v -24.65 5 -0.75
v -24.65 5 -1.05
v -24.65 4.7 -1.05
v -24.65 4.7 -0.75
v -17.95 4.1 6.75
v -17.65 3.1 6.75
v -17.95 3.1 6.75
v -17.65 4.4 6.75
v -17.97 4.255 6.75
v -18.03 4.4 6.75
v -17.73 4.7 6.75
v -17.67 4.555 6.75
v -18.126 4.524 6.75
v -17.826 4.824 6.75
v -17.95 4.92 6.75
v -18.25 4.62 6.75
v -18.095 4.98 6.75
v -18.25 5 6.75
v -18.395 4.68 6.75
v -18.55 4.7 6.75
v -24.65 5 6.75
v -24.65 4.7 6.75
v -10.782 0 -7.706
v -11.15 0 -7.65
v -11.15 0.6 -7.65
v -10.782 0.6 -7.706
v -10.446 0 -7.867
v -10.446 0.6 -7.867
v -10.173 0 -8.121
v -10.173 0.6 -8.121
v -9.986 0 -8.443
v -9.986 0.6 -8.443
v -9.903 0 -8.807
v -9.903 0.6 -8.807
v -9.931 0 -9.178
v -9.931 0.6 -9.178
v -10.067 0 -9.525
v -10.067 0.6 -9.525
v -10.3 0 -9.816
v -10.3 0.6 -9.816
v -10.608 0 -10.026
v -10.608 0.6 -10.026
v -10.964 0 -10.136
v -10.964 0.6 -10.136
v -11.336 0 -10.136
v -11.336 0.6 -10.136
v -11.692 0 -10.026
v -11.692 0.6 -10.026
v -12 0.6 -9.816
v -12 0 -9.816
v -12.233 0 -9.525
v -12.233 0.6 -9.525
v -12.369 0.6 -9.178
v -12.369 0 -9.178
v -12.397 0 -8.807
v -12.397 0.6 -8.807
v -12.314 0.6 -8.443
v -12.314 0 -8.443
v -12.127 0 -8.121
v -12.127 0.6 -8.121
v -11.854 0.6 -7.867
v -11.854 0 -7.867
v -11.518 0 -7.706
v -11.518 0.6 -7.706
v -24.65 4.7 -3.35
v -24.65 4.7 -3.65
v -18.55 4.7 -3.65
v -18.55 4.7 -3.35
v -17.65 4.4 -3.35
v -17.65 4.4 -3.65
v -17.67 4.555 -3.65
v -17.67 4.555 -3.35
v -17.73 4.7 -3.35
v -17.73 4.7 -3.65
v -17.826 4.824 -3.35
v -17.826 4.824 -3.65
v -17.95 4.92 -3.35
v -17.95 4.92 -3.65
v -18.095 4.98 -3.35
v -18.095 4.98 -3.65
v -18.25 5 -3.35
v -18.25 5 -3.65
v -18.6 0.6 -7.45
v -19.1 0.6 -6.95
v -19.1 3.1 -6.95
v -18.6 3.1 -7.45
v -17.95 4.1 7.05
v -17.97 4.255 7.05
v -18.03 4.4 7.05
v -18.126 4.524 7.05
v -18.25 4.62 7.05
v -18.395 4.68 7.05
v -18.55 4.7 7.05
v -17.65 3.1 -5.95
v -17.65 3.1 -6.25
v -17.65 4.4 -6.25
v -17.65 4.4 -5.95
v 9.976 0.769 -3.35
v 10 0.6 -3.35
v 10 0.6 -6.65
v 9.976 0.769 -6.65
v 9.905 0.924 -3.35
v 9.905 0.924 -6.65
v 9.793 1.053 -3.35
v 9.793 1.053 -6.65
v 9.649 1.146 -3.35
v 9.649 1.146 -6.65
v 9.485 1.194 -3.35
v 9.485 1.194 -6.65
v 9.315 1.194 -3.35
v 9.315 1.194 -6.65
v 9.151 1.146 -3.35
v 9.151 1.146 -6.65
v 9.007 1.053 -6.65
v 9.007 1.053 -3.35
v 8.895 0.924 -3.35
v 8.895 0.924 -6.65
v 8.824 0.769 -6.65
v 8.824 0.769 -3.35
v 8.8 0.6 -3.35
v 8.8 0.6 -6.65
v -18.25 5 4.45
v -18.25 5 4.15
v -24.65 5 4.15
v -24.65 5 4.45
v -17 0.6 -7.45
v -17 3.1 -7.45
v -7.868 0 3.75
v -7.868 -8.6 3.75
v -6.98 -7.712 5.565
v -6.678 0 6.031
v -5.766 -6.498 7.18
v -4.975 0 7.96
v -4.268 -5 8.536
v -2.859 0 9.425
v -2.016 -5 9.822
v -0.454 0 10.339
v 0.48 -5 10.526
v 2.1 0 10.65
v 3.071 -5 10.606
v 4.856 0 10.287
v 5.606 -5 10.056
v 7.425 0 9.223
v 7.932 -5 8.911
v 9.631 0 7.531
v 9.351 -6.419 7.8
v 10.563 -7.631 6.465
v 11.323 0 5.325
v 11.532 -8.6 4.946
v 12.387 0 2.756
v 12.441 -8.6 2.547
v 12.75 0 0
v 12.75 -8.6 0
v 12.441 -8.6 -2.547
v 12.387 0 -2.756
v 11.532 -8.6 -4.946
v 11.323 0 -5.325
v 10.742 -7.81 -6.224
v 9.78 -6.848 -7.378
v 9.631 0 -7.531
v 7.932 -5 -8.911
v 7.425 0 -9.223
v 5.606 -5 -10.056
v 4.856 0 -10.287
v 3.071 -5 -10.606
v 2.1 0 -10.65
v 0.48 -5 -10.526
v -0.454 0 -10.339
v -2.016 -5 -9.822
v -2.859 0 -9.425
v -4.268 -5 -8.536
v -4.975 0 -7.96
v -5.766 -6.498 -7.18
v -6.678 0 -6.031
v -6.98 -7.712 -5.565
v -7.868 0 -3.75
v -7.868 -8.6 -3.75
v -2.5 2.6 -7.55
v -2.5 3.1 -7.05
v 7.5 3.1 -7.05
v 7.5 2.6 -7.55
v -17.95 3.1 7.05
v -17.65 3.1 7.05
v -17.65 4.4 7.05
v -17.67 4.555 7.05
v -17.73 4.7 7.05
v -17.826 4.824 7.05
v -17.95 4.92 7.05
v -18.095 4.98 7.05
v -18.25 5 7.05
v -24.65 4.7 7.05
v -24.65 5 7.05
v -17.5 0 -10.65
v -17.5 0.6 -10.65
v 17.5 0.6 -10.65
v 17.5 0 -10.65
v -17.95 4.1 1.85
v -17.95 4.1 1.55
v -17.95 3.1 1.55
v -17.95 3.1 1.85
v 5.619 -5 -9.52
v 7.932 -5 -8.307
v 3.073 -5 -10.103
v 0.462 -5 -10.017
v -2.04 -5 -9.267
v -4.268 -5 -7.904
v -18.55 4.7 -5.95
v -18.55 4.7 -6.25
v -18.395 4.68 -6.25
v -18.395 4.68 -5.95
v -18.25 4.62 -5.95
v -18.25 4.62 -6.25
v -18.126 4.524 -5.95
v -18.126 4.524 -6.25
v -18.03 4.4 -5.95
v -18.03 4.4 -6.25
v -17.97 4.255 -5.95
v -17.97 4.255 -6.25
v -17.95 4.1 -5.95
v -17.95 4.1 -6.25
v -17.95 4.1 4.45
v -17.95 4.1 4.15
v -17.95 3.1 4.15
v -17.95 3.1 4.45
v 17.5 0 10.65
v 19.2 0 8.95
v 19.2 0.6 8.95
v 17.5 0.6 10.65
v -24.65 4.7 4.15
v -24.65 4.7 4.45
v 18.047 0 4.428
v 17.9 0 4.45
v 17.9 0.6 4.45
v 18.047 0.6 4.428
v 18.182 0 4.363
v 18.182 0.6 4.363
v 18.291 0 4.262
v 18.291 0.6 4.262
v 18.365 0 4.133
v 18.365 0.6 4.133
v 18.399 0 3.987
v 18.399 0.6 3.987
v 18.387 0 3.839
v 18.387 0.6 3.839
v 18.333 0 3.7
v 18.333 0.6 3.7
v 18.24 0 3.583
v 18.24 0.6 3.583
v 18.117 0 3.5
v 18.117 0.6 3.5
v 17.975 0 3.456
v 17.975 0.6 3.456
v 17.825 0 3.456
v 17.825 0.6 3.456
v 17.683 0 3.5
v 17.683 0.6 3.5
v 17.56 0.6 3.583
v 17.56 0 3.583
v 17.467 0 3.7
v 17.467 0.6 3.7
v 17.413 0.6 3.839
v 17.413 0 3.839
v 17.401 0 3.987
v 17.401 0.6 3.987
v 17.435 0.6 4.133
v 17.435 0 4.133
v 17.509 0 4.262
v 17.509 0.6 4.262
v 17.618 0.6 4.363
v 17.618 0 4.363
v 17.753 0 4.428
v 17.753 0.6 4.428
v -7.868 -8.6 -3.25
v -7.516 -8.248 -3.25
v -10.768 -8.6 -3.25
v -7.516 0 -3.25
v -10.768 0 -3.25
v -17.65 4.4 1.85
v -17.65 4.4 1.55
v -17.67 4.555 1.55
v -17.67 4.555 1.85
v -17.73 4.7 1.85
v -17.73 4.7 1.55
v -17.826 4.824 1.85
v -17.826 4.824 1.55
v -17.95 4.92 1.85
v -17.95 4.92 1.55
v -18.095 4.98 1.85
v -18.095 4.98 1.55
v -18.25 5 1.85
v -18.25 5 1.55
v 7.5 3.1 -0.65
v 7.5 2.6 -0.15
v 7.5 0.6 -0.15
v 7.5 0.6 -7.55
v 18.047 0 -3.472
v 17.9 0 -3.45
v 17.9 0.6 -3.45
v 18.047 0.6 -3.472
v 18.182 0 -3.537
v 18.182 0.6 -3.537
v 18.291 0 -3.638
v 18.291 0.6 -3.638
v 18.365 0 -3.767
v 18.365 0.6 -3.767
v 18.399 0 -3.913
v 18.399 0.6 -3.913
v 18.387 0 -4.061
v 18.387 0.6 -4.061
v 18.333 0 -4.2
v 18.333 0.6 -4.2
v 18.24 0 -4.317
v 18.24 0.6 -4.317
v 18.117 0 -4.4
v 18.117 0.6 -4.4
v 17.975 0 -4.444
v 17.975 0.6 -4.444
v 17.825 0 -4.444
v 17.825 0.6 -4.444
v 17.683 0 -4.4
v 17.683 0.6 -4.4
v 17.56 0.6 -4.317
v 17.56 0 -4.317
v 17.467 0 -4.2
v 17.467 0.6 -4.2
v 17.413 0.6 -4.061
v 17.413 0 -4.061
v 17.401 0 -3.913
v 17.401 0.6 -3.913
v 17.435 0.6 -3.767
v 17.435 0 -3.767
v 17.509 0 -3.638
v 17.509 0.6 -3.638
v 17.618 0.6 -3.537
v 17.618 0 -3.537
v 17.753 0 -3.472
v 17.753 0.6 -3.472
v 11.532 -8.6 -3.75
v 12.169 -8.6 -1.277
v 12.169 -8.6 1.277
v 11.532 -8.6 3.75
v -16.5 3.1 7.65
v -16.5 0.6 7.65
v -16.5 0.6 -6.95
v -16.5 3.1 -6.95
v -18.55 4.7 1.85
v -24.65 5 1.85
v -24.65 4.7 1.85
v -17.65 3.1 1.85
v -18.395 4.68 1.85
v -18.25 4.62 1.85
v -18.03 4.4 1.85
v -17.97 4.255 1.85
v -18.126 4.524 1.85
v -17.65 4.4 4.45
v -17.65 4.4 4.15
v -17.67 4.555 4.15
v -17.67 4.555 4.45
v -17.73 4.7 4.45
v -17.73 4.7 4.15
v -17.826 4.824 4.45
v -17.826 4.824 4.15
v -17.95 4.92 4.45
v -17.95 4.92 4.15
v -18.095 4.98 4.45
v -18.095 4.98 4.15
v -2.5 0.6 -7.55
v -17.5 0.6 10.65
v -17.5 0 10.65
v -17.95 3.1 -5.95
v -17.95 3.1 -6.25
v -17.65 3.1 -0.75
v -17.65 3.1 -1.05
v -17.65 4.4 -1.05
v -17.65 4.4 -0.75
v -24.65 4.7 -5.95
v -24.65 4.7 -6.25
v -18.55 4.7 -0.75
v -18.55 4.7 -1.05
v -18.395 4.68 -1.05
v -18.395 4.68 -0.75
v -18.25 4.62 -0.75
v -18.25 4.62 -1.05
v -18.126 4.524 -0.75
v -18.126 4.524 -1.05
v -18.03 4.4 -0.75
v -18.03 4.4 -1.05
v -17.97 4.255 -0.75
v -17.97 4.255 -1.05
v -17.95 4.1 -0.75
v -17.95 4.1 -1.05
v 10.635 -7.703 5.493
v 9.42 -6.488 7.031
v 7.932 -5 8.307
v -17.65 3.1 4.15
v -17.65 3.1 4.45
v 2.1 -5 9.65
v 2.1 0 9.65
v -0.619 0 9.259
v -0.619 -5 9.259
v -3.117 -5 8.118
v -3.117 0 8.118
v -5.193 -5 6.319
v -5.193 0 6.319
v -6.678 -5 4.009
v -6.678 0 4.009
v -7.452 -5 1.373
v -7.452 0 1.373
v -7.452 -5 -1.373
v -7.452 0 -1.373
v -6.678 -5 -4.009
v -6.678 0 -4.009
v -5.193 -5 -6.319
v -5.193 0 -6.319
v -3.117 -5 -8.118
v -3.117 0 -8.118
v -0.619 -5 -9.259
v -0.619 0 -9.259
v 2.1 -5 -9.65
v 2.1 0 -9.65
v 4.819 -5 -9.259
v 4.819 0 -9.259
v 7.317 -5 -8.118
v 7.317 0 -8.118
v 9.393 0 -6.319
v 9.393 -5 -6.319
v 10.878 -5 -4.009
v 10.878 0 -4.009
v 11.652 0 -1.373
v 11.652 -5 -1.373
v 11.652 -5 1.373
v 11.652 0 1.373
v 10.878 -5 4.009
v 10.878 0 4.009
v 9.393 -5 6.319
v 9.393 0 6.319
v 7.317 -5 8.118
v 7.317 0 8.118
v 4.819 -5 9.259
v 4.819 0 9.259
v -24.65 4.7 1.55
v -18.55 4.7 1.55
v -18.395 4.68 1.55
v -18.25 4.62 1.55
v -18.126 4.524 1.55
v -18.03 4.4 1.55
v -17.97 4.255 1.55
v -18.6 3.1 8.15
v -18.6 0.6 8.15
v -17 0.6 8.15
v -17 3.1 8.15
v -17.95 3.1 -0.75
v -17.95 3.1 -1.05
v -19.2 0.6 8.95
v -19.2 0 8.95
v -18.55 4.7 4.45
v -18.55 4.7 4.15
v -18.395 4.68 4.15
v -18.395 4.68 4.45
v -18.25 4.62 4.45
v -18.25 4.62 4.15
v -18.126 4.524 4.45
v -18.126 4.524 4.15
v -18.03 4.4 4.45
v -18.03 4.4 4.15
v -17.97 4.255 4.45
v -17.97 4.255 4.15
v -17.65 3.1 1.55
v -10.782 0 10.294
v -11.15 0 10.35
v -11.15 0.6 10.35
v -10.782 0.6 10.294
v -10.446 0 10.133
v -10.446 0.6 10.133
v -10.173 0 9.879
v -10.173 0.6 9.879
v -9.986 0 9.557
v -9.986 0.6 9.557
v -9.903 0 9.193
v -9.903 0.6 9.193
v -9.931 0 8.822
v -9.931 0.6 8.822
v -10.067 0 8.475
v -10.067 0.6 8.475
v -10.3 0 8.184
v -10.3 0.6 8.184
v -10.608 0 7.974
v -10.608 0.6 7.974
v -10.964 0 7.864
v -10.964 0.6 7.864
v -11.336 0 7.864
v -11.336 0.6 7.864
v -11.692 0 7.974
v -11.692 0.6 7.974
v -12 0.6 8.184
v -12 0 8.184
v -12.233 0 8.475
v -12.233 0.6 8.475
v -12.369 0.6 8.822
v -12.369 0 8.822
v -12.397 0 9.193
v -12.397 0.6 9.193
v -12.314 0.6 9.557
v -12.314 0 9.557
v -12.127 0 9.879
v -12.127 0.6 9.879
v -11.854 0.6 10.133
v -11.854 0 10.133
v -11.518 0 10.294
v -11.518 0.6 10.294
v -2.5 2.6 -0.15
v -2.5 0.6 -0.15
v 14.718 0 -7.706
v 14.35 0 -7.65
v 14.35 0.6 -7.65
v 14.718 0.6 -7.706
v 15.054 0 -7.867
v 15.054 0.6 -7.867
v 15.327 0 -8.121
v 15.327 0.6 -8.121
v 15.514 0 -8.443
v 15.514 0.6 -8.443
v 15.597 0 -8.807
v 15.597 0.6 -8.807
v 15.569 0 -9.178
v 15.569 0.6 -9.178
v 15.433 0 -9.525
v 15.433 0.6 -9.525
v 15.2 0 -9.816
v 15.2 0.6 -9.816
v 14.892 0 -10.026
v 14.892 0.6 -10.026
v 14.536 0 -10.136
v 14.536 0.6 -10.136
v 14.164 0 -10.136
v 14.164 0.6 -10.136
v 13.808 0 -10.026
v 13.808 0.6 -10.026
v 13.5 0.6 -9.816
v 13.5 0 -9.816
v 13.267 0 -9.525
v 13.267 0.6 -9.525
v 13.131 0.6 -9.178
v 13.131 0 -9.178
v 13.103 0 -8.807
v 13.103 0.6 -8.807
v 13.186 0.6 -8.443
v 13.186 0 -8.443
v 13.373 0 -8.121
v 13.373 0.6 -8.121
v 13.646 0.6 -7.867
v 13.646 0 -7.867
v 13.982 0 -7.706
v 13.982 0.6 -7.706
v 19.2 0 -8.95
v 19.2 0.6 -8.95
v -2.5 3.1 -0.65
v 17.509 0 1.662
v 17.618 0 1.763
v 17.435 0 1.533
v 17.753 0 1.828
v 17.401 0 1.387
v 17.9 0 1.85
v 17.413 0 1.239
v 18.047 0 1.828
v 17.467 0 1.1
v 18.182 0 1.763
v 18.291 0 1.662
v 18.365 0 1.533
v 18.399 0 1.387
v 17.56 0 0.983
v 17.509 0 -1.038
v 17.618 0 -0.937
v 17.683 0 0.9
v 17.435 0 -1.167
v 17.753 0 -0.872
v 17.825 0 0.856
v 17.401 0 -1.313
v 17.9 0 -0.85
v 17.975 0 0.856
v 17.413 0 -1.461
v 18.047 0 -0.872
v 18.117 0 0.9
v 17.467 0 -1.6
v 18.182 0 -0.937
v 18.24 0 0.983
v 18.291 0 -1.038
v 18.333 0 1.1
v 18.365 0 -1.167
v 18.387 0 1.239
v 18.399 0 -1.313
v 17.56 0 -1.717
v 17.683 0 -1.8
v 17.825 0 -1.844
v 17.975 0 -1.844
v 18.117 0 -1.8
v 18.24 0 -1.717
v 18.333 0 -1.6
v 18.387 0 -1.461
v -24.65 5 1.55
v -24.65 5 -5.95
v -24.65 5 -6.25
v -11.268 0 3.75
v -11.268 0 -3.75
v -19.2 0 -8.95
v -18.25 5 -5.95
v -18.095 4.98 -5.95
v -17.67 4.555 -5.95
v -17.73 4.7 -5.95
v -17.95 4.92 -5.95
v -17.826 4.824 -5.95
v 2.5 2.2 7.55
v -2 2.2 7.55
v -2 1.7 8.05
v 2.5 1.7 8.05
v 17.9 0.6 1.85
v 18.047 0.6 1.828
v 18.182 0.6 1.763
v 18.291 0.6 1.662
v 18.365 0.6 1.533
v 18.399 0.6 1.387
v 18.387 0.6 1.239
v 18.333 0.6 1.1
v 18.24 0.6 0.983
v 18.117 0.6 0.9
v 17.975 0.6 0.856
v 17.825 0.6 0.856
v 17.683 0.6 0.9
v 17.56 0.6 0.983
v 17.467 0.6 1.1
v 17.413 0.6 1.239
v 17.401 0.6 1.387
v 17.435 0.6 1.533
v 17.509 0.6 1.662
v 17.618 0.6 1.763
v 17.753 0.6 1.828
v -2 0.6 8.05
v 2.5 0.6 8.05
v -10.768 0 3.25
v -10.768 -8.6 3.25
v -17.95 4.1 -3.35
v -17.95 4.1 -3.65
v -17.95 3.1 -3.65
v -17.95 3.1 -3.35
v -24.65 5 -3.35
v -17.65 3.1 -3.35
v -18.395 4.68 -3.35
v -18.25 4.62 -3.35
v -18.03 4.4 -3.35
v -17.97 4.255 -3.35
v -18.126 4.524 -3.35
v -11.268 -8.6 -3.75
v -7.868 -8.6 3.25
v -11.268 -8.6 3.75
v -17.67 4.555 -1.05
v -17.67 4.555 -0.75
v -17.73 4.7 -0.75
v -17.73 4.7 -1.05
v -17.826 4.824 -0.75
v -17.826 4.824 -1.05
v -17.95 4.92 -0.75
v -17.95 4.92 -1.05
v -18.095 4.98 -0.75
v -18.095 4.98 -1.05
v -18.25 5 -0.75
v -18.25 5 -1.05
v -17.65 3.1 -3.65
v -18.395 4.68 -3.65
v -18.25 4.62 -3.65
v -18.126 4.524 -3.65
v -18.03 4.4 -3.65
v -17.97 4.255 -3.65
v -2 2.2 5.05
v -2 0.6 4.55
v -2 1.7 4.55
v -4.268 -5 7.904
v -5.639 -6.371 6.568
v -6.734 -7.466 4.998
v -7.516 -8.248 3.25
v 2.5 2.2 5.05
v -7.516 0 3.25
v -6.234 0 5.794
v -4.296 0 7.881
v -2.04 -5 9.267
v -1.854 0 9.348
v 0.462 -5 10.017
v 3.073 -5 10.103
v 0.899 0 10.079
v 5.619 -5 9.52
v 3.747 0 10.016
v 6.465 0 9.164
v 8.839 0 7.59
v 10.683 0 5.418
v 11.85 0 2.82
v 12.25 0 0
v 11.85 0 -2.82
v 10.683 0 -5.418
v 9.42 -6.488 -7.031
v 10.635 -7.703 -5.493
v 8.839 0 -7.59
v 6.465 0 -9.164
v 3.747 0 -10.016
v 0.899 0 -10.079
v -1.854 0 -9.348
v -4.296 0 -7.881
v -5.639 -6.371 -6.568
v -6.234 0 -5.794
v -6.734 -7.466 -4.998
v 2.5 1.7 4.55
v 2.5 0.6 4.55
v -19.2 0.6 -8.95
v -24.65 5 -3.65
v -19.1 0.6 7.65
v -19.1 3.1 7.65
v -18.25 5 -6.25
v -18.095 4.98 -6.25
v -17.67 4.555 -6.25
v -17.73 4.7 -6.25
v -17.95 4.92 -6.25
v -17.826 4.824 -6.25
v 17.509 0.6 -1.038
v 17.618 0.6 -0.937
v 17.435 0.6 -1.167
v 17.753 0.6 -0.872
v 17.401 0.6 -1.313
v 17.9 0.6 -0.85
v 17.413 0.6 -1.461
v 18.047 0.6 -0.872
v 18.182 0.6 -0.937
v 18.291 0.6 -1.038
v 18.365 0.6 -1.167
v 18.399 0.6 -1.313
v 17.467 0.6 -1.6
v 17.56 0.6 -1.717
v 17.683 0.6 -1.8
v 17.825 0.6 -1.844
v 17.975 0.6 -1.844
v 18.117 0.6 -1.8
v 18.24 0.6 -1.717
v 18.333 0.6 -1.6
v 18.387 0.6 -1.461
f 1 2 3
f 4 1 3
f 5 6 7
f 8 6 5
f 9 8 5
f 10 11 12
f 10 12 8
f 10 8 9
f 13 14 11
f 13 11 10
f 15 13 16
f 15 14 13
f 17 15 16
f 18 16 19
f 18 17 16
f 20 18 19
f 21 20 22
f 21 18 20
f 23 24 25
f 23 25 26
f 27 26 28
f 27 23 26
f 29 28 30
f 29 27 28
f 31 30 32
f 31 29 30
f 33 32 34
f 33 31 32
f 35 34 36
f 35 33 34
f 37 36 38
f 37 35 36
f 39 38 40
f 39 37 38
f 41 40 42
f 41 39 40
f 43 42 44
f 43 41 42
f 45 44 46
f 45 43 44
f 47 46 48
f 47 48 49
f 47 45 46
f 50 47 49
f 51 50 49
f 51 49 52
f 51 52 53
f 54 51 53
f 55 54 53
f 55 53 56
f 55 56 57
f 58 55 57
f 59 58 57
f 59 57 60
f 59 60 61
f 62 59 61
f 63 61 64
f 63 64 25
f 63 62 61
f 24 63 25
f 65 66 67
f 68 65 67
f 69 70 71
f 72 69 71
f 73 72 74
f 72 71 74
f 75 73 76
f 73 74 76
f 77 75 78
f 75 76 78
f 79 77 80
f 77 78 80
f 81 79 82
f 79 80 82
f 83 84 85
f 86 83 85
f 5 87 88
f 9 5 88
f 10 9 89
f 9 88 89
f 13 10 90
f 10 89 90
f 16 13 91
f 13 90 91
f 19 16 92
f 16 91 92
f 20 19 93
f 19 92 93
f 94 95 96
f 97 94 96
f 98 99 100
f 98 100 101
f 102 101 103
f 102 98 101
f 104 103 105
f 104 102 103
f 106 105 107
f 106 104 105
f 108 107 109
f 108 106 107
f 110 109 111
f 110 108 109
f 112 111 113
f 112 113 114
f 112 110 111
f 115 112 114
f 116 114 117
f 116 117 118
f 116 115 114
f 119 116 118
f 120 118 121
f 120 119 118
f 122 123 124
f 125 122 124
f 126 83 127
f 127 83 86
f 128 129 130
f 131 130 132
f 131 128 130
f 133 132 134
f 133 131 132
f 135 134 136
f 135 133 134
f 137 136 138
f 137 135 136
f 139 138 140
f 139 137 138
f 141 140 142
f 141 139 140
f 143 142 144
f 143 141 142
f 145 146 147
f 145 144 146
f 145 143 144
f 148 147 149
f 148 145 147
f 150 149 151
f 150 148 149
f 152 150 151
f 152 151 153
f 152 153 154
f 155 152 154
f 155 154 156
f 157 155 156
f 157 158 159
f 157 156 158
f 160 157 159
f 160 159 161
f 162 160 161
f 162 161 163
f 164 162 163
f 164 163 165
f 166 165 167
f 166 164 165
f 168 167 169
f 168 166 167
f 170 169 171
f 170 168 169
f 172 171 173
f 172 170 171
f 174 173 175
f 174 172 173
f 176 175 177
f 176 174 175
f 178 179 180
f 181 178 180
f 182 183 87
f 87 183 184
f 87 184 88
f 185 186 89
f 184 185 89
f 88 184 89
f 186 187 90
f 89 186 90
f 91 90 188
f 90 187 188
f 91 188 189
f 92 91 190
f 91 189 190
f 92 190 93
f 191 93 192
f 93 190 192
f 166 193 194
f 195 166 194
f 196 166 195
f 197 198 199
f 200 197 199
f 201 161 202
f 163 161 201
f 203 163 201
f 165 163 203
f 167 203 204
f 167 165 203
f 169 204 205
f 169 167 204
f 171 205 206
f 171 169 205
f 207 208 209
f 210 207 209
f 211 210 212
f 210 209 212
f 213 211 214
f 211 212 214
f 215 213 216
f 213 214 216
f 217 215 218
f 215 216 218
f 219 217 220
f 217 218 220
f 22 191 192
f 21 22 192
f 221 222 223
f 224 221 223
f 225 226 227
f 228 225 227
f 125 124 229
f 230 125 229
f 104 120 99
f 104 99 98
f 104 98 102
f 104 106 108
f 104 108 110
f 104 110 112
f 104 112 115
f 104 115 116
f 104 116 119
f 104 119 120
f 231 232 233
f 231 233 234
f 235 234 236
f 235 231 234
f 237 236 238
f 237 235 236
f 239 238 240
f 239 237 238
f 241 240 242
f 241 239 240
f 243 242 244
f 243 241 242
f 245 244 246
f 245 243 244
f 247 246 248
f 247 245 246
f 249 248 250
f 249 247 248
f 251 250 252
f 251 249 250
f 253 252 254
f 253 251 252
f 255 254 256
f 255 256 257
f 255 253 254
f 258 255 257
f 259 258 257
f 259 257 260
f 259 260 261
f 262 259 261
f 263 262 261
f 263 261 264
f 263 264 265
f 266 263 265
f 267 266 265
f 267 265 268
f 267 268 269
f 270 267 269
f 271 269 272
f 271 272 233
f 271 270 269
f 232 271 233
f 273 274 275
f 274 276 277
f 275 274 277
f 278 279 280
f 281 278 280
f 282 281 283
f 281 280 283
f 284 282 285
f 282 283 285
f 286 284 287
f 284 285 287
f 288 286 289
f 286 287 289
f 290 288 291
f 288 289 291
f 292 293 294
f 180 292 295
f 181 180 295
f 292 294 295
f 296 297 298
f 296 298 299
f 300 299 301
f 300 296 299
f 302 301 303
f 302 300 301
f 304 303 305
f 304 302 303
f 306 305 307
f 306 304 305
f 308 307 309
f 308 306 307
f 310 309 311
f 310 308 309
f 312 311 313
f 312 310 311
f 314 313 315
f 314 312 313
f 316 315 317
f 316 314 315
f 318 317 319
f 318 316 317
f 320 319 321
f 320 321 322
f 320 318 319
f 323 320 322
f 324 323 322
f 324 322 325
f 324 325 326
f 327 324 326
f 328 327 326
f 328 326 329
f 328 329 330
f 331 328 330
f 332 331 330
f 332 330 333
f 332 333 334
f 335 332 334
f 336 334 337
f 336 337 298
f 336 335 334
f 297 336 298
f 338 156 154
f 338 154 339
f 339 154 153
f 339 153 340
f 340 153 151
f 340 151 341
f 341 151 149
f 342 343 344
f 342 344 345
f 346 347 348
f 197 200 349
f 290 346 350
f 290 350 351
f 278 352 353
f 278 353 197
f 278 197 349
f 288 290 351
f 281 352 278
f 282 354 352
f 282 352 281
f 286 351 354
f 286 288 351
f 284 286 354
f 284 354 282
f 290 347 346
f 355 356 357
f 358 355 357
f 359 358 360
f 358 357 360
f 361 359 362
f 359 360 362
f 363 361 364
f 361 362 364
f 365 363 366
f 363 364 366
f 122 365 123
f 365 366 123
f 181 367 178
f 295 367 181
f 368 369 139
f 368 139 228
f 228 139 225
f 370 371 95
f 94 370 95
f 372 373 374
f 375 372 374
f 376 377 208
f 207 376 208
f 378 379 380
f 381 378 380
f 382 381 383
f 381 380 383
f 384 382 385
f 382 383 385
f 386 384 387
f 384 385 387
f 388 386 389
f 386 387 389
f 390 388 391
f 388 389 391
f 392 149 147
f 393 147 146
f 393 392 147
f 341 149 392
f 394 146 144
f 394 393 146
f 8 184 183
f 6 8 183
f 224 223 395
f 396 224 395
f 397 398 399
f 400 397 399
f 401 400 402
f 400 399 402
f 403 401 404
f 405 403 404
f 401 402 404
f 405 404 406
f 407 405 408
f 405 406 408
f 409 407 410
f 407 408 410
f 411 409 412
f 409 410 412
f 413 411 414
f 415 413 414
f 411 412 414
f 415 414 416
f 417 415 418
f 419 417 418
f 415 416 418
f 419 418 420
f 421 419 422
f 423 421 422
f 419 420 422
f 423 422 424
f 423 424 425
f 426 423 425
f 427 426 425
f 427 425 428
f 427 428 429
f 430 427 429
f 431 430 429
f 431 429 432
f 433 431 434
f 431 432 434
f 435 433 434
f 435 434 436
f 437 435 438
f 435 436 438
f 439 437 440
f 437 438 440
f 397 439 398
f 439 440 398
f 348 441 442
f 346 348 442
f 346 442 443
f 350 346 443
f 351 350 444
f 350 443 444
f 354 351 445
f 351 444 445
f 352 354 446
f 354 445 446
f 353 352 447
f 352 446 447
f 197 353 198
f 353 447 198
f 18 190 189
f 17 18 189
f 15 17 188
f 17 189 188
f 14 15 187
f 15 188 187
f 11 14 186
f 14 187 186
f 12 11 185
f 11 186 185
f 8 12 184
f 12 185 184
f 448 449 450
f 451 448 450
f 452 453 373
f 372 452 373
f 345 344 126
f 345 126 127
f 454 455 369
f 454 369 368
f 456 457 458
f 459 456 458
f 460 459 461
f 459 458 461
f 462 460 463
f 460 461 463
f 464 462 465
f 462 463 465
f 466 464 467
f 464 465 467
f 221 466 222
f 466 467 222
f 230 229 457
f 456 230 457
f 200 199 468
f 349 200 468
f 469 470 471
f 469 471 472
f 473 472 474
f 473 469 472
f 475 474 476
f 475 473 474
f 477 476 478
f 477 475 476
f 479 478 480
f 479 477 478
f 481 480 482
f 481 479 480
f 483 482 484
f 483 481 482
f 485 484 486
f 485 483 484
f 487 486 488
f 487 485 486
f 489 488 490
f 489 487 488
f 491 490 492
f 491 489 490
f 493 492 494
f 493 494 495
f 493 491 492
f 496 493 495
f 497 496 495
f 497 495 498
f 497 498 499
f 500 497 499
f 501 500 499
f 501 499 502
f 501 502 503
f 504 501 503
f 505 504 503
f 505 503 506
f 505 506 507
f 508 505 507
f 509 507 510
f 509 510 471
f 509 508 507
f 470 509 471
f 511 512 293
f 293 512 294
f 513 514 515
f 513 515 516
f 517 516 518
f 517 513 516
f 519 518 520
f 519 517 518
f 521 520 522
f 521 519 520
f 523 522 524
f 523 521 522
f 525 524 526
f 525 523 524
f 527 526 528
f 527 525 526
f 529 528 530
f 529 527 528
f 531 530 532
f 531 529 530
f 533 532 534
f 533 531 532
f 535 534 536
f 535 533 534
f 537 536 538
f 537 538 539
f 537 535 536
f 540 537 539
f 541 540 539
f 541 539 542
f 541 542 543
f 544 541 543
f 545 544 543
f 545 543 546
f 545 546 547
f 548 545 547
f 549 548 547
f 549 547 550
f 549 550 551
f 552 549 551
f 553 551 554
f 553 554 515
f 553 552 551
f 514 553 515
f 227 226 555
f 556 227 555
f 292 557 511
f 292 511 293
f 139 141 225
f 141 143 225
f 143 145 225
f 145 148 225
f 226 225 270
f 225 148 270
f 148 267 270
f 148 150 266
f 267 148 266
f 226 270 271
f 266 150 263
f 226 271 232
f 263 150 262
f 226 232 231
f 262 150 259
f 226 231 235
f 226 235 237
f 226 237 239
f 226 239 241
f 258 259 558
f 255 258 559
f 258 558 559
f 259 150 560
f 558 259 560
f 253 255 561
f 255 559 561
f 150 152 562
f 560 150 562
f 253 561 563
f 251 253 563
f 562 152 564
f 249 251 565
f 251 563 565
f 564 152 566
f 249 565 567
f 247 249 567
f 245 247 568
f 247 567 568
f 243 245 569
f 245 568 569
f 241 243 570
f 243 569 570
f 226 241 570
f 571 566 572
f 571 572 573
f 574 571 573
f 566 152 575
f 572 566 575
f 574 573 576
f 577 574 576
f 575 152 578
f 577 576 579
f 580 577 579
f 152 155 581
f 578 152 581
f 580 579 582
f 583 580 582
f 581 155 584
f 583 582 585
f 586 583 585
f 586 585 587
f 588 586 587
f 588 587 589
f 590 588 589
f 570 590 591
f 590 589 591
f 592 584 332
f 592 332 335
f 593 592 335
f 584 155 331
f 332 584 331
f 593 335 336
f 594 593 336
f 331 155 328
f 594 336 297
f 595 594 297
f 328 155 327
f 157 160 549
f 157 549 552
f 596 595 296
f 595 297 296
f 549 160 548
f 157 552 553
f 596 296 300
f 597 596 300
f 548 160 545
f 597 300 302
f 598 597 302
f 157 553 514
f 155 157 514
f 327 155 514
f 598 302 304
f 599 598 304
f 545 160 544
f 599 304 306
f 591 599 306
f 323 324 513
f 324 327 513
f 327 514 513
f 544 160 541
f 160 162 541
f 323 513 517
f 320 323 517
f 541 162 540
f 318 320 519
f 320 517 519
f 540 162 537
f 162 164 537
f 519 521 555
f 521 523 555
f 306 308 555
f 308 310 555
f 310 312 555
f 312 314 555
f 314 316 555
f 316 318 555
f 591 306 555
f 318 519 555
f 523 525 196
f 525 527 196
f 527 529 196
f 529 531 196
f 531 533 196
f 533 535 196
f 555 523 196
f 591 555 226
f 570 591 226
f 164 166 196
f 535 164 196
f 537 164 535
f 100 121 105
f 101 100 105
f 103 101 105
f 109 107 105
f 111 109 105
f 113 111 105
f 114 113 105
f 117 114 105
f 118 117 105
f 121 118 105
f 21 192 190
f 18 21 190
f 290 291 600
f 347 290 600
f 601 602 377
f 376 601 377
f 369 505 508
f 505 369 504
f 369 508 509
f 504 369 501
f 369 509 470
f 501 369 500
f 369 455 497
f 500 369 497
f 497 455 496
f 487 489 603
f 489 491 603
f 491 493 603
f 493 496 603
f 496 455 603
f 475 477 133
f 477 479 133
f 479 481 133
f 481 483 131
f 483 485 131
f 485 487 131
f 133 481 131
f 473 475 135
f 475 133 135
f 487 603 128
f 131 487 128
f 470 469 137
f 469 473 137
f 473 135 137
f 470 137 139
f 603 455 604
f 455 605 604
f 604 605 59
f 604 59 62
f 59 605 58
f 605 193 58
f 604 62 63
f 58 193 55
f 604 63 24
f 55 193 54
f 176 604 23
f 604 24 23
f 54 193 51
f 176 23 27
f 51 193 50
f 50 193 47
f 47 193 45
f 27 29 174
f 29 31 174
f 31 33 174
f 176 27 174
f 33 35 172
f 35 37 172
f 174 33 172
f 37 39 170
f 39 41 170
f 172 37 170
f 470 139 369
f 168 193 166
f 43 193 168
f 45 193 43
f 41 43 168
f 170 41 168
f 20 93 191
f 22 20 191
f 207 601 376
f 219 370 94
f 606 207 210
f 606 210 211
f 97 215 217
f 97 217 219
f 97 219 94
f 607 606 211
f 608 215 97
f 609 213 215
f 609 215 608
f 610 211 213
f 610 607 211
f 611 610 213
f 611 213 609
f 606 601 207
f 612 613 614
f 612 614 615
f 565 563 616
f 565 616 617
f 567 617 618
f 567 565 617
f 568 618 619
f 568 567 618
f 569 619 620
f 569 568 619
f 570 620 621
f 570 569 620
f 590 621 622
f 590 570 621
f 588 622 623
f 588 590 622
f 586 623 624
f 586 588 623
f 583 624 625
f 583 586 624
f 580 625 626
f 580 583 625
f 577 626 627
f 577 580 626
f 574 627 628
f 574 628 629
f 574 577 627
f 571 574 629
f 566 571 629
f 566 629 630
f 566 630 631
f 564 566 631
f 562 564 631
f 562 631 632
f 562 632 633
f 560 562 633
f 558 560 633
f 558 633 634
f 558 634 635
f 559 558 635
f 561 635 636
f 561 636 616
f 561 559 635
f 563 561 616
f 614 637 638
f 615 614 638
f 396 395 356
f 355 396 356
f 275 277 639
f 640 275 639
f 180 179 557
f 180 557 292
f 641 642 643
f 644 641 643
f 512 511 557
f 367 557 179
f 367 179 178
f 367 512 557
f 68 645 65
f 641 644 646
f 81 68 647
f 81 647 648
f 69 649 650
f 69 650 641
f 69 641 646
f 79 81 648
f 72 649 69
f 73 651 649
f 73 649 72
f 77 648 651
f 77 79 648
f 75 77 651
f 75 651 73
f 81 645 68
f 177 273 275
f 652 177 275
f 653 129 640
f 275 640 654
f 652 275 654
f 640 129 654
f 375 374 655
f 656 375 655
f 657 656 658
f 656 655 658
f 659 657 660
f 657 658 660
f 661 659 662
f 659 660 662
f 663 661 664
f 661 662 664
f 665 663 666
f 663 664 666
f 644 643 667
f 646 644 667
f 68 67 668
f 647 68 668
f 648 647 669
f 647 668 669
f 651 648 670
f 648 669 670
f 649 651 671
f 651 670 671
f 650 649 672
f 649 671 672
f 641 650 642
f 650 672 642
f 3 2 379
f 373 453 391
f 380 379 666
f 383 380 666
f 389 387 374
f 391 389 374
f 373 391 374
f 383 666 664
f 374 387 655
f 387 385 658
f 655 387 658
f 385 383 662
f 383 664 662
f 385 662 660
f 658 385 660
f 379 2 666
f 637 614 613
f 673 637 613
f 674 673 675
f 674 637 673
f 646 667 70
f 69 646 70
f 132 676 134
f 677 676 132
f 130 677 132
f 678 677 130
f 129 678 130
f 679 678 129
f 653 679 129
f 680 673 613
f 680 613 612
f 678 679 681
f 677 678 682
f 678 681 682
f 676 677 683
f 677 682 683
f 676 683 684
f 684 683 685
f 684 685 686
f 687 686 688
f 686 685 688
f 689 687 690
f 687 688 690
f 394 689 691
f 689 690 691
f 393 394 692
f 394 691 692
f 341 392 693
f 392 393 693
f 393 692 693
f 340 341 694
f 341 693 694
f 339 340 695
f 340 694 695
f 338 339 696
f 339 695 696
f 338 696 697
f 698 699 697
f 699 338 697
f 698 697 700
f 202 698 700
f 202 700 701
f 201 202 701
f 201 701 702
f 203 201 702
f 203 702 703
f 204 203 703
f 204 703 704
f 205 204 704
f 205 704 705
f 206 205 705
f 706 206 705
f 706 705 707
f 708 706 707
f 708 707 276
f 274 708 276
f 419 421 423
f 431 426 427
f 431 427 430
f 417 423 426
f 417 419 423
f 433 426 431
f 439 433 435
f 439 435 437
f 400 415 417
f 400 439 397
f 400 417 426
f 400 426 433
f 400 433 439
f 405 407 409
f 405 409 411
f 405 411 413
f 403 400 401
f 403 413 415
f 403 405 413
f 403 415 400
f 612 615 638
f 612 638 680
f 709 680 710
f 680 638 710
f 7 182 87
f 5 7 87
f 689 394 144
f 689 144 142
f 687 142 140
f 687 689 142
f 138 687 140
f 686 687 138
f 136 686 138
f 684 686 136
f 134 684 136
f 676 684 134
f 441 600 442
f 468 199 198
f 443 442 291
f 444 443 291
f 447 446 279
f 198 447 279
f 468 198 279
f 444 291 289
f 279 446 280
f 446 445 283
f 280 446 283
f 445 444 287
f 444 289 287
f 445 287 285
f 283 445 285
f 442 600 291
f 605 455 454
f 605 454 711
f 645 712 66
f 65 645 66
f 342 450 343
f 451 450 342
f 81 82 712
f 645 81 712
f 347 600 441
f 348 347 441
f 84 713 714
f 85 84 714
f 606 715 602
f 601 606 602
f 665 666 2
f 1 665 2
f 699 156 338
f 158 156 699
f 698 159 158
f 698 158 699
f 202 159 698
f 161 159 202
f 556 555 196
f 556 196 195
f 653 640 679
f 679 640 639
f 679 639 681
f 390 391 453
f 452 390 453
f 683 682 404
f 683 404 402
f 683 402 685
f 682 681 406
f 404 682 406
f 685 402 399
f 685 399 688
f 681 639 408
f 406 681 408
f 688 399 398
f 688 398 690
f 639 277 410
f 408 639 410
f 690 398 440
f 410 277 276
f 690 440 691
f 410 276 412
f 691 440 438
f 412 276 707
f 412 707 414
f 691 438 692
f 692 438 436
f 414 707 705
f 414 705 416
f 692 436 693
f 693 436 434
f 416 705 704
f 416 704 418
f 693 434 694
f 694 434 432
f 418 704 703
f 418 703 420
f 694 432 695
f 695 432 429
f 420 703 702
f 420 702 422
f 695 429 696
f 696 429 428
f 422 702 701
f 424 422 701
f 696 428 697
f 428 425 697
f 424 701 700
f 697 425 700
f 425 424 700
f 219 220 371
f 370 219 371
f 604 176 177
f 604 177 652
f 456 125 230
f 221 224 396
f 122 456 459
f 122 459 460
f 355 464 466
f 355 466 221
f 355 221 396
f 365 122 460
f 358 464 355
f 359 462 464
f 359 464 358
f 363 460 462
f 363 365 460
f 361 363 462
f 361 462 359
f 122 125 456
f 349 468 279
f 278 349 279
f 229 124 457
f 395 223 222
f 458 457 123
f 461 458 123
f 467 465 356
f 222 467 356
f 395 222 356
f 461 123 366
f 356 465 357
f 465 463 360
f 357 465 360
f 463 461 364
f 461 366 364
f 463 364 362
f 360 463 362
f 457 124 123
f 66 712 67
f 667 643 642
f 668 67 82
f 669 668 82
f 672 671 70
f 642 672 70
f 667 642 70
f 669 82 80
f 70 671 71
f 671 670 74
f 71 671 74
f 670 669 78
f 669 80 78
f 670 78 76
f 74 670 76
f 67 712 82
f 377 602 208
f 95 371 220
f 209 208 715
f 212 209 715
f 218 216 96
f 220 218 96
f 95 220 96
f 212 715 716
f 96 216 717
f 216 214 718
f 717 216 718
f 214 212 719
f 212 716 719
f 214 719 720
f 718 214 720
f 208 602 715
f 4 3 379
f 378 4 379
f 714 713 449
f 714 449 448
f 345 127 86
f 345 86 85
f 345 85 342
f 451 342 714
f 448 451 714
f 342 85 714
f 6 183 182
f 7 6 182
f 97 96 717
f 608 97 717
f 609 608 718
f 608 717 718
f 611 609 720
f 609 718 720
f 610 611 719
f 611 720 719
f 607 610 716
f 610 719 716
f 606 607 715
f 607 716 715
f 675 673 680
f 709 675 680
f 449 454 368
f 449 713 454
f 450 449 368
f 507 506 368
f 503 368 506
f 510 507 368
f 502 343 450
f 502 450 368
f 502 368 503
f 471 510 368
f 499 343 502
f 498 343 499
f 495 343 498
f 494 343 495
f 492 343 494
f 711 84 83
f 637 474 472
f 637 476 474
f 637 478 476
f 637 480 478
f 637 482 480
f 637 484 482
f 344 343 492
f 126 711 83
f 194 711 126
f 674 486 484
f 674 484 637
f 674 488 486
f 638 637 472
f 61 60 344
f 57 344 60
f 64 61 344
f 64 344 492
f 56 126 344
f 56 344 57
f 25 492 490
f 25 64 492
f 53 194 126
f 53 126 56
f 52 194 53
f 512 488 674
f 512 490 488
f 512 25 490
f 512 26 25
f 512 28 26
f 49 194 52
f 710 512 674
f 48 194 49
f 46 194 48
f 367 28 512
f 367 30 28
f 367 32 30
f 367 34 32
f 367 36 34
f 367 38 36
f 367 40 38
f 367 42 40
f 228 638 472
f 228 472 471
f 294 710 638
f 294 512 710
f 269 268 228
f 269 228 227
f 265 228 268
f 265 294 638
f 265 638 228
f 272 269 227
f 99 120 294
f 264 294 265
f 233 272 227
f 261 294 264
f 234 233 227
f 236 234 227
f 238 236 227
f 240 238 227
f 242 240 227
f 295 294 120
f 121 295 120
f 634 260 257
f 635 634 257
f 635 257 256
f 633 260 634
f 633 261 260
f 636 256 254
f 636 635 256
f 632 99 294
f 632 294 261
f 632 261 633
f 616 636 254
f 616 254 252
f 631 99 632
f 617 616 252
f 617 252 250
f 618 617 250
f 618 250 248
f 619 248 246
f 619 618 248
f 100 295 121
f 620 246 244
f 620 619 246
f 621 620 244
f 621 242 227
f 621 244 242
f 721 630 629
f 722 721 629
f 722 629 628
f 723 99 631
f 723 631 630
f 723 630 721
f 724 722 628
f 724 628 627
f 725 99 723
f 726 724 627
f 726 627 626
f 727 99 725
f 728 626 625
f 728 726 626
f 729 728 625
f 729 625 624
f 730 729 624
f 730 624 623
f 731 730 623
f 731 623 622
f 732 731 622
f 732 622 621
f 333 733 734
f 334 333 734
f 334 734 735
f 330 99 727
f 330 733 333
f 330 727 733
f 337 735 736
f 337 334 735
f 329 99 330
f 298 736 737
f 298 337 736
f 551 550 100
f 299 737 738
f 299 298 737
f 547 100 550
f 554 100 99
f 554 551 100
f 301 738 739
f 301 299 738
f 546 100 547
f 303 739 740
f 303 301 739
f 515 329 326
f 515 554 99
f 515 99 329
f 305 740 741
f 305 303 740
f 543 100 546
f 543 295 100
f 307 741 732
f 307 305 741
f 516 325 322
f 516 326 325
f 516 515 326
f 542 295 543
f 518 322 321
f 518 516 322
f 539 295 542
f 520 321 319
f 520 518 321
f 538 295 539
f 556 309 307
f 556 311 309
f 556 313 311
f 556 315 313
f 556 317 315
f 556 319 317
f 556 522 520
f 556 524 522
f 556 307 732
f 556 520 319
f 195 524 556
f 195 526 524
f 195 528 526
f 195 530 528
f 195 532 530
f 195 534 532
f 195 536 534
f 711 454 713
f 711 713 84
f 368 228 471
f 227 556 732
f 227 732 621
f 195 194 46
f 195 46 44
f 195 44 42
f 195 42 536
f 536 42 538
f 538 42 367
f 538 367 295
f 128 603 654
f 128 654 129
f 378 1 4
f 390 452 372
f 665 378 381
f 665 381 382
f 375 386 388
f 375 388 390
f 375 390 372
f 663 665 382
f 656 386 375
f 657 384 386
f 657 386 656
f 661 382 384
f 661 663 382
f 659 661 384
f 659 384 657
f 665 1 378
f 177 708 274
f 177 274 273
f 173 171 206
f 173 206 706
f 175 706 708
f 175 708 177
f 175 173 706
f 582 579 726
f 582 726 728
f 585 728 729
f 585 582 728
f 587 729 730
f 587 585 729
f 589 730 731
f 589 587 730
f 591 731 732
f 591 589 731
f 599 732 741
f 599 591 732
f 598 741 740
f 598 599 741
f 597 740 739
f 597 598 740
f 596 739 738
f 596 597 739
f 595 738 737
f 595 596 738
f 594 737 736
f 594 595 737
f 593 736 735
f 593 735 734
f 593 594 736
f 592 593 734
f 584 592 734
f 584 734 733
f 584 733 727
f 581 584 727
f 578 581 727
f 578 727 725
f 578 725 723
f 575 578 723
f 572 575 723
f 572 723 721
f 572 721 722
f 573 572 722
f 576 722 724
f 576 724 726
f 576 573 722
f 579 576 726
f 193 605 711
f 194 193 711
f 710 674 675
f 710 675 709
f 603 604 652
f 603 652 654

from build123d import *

# Parameters (mm, degrees)
SKETCH1_W             = 38.4
SKETCH1_H             = 21.3
SKETCH1_R             = 1.25
SKETCH1_R_2           = 0.5
BOSS_EXTRUDE1_DEPTH   = 0.6
CHAMFER1_SIZE         = 1.7
SKETCH3_W             = 2.6
SKETCH3_H             = 2.6
BOSS_EXTRUDE2_DEPTH   = 2.5
BOSS_EXTRUDE3_START   = -1.1
BOSS_EXTRUDE3_DEPTH   = 0.3
LPATTERN4_START       = -6.25
LPATTERN4_DEPTH       = 0.3
LPATTERN4_START_2     = -3.65
LPATTERN4_2_DEPTH     = 0.3
LPATTERN4_START_3     = -1.05
LPATTERN4_3_DEPTH     = 0.3
LPATTERN4_START_4     = 1.55
LPATTERN4_4_DEPTH     = 0.3
LPATTERN4_START_5     = 4.15
LPATTERN4_5_DEPTH     = 0.3
LPATTERN4_START_6     = -19.1
LPATTERN4_6_OUTLINE_W = 2.5
LPATTERN4_6_OUTLINE_H = 13
LPATTERN4_6_DEPTH     = 2.6
CHAMFER3_SIZE         = 0.5
SKETCH5_W             = 10
SKETCH5_H             = 7.4
BOSS_EXTRUDE4_DEPTH   = 2.5
SKETCH6_W             = 4.5
SKETCH6_H             = 3.5
BOSS_EXTRUDE5_DEPTH   = 1.6
CHAMFER4_SIZE         = 0.5
BOSS_EXTRUDE6_START   = -14
BOSS_EXTRUDE6_DEPTH   = 3.3
BOSS_EXTRUDE7_DEPTH   = 8.6
CUT_EXTRUDE1_DEPTH    = 34.693805069
SKETCH13_R            = 9.65
BOSS_EXTRUDE9_DEPTH   = 5


# Read off the part's stored shape, not the designer's step: LPattern4
with BuildPart() as part:
    # Sketch1 → Boss-Extrude1 (new body)
    with BuildSketch(Plane(origin=(0, 0, 0), x_dir=(1, 0, 0), z_dir=(0, 1, 0))):
        Rectangle(SKETCH1_W, SKETCH1_H)
        with Locations(Location((-11.15, 8.9, 0), (0, 0, 270))):
            Circle(SKETCH1_R, mode=Mode.SUBTRACT)
        with Locations(Location((14.35, 8.9, 0), (0, 0, 270))):
            Circle(SKETCH1_R, mode=Mode.SUBTRACT)
        with Locations(Location((-11.15, -9.1, 0), (0, 0, 270))):
            Circle(SKETCH1_R, mode=Mode.SUBTRACT)
        with Locations(Location((17.9, 3.95, 0), (0, 0, 270))):
            Circle(SKETCH1_R_2, mode=Mode.SUBTRACT)
        with Locations(Location((17.9, 1.35, 0), (0, 0, 270))):
            Circle(SKETCH1_R_2, mode=Mode.SUBTRACT)
        with Locations(Location((17.9, -1.35, 0), (0, 0, 270))):
            Circle(SKETCH1_R_2, mode=Mode.SUBTRACT)
        with Locations(Location((17.9, -3.95, 0), (0, 0, 270))):
            Circle(SKETCH1_R_2, mode=Mode.SUBTRACT)
    extrude(amount=BOSS_EXTRUDE1_DEPTH)

    # Chamfer1
    chamfer1_edges = [part.edges().sort_by_distance(p)[0] for p in [
        (-19.2, 0.3, -10.65),
        (19.2, 0.3, -10.65),
        (19.2, 0.3, 10.65),
        (-19.2, 0.3, 10.65),
    ]]
    chamfer(chamfer1_edges, length=CHAMFER1_SIZE)

    # Sketch3 → Boss-Extrude2 (add)
    with BuildSketch(Plane(origin=(0, 0.6, 0), x_dir=(1, 0, 0), z_dir=(0, 1, 0))):
        with Locations((-17.8, -6.85)):
            Rectangle(SKETCH3_W, SKETCH3_H)
    extrude(amount=BOSS_EXTRUDE2_DEPTH)

    # LPattern4 6 outline → LPattern4 6 (add)
    with BuildSketch(Plane.YZ.offset(LPATTERN4_START_6)):
        with Locations((1.85, -0.95)):
            Rectangle(LPATTERN4_6_OUTLINE_W, LPATTERN4_6_OUTLINE_H)
    extrude(amount=LPATTERN4_6_DEPTH)

    # Chamfer3
    chamfer3_edges = [part.edges().sort_by_distance(p)[0] for p in [
        (-19.1, 1.85, 8.15),
        (-16.5, 1.85, 8.15),
        (-19.1, 1.85, -7.45),
        (-16.5, 1.85, -7.45),
    ]]
    chamfer(chamfer3_edges, length=CHAMFER3_SIZE)

    # Sketch5 → Boss-Extrude4 (add)
    with BuildSketch(Plane(origin=(0, 0.6, 0), x_dir=(1, 0, 0), z_dir=(0, 1, 0))):
        with Locations((2.5, 3.85)):
            Rectangle(SKETCH5_W, SKETCH5_H)
    extrude(amount=BOSS_EXTRUDE4_DEPTH)

    # Sketch6 → Boss-Extrude5 (add)
    with BuildSketch(Plane(origin=(0, 0.6, 0), x_dir=(1, 0, 0), z_dir=(0, 1, 0))):
        with Locations((0.25, -6.3)):
            Rectangle(SKETCH6_W, SKETCH6_H)
    extrude(amount=BOSS_EXTRUDE5_DEPTH)

    # Chamfer4
    chamfer4_edges = [part.edges().sort_by_distance(p)[0] for p in [
        (2.5, 3.1, -0.15),
        (2.5, 3.1, -7.55),
        (0.25, 2.2, 8.05),
        (0.25, 2.2, 4.55),
    ]]
    chamfer(chamfer4_edges, length=CHAMFER4_SIZE)

    # Sketch8 → Boss-Extrude6 (add)
    with BuildSketch(Plane.XY.offset(10.65).offset(BOSS_EXTRUDE6_START)):
        with BuildLine():
            Line((8.8, 0.6), (10, 0.6))
            ThreePointArc((10, 0.6), (9.4, 1.2), (8.8, 0.6))
        make_face()
    extrude(amount=-BOSS_EXTRUDE6_DEPTH)

    # Sketch9 → Boss-Extrude7 (add)
    with BuildSketch(Plane.XZ):
        with BuildLine():
            Line((-7.867948636, -3.75), (-11.267948636, -3.75))
            Line((-11.267948636, -3.75), (-11.267948636, 3.75))
            Line((-11.267948636, 3.75), (-7.867948636, 3.75))
            ThreePointArc((-7.867948636, 3.75), (12.75, 0), (-7.867948636, -3.75))
        make_face()
        with BuildLine():
            Line((-10.767948636, 3.25), (-7.515612305, 3.25))
            ThreePointArc((-7.515612305, 3.25), (12.25, 0), (-7.515612305, -3.25))
            Line((-7.515612305, -3.25), (-10.767948636, -3.25))
            Line((-10.767948636, -3.25), (-10.767948636, 3.25))
        make_face(mode=Mode.SUBTRACT)
    extrude(amount=BOSS_EXTRUDE7_DEPTH)

    # Sketch10 → Cut-Extrude1 (cut, through all)
    with BuildSketch(Plane(origin=(0, 0, -10.65), x_dir=(-1, 0, 0), z_dir=(0, 0, -1))):
        Polygon((-11.532051364, -8.6), (-7.932051364, -5), (4.267948636, -5), (7.867948636, -8.6), align=None)
    extrude(amount=-CUT_EXTRUDE1_DEPTH, mode=Mode.SUBTRACT)

    # Sketch13 → Boss-Extrude9 (add)
    with BuildSketch(Plane.XZ):
        with Locations(Location((2.1, 0, 0), (0, 0, 90))):
            Circle(SKETCH13_R)
    extrude(amount=BOSS_EXTRUDE9_DEPTH)


with BuildPart() as body_2:
    # Sketch4 → Boss-Extrude3 (new body)
    with BuildSketch(Plane.XY.offset(8.15).offset(BOSS_EXTRUDE3_START)):
        with BuildLine():
            Line((-17.65, 3.1), (-17.95, 3.1))
            Line((-17.95, 3.1), (-17.95, 4.1))
            ThreePointArc((-17.95, 4.1), (-18.125735931, 4.524264069), (-18.55, 4.7))
            Line((-18.55, 4.7), (-24.65, 4.7))
            Line((-24.65, 4.7), (-24.65, 5))
            Line((-24.65, 5), (-18.25, 5))
            ThreePointArc((-18.25, 5), (-17.825735931, 4.824264069), (-17.65, 4.4))
            Line((-17.65, 4.4), (-17.65, 3.1))
        make_face()
    extrude(amount=-BOSS_EXTRUDE3_DEPTH)


with BuildPart() as body_3:
    # LPattern4 outline → LPattern4 (new body)
    with BuildSketch(Plane.XY.offset(LPATTERN4_START)):
        with BuildLine():
            Line((-17.95, 3.1), (-17.65, 3.1))
            Line((-17.65, 3.1), (-17.65, 4.4))
            ThreePointArc((-17.65, 4.4), (-17.825735931, 4.824264069), (-18.25, 5))
            Line((-18.25, 5), (-24.65, 5))
            Line((-24.65, 5), (-24.65, 4.7))
            Line((-24.65, 4.7), (-18.55, 4.7))
            ThreePointArc((-18.55, 4.7), (-18.125735931, 4.524264069), (-17.95, 4.1))
            Line((-17.95, 4.1), (-17.95, 3.1))
        make_face()
    extrude(amount=LPATTERN4_DEPTH)


with BuildPart() as body_4:
    # LPattern4 2 outline → LPattern4 2 (new body)
    with BuildSketch(Plane.XY.offset(LPATTERN4_START_2)):
        with BuildLine():
            Line((-17.95, 3.1), (-17.65, 3.1))
            Line((-17.65, 3.1), (-17.65, 4.4))
            ThreePointArc((-17.65, 4.4), (-17.825735931, 4.824264069), (-18.25, 5))
            Line((-18.25, 5), (-24.65, 5))
            Line((-24.65, 5), (-24.65, 4.7))
            Line((-24.65, 4.7), (-18.55, 4.7))
            ThreePointArc((-18.55, 4.7), (-18.125735931, 4.524264069), (-17.95, 4.1))
            Line((-17.95, 4.1), (-17.95, 3.1))
        make_face()
    extrude(amount=LPATTERN4_2_DEPTH)


with BuildPart() as body_5:
    # LPattern4 3 outline → LPattern4 3 (new body)
    with BuildSketch(Plane.XY.offset(LPATTERN4_START_3)):
        with BuildLine():
            Line((-17.95, 3.1), (-17.65, 3.1))
            Line((-17.65, 3.1), (-17.65, 4.4))
            ThreePointArc((-17.65, 4.4), (-17.825735931, 4.824264069), (-18.25, 5))
            Line((-18.25, 5), (-24.65, 5))
            Line((-24.65, 5), (-24.65, 4.7))
            Line((-24.65, 4.7), (-18.55, 4.7))
            ThreePointArc((-18.55, 4.7), (-18.125735931, 4.524264069), (-17.95, 4.1))
            Line((-17.95, 4.1), (-17.95, 3.1))
        make_face()
    extrude(amount=LPATTERN4_3_DEPTH)


with BuildPart() as body_6:
    # LPattern4 4 outline → LPattern4 4 (new body)
    with BuildSketch(Plane.XY.offset(LPATTERN4_START_4)):
        with BuildLine():
            Line((-17.95, 3.1), (-17.65, 3.1))
            Line((-17.65, 3.1), (-17.65, 4.4))
            ThreePointArc((-17.65, 4.4), (-17.825735931, 4.824264069), (-18.25, 5))
            Line((-18.25, 5), (-24.65, 5))
            Line((-24.65, 5), (-24.65, 4.7))
            Line((-24.65, 4.7), (-18.55, 4.7))
            ThreePointArc((-18.55, 4.7), (-18.125735931, 4.524264069), (-17.95, 4.1))
            Line((-17.95, 4.1), (-17.95, 3.1))
        make_face()
    extrude(amount=LPATTERN4_4_DEPTH)


with BuildPart() as body_7:
    # LPattern4 5 outline → LPattern4 5 (new body)
    with BuildSketch(Plane.XY.offset(LPATTERN4_START_5)):
        with BuildLine():
            Line((-17.95, 3.1), (-17.65, 3.1))
            Line((-17.65, 3.1), (-17.65, 4.4))
            ThreePointArc((-17.65, 4.4), (-17.825735931, 4.824264069), (-18.25, 5))
            Line((-18.25, 5), (-24.65, 5))
            Line((-24.65, 5), (-24.65, 4.7))
            Line((-24.65, 4.7), (-18.55, 4.7))
            ThreePointArc((-18.55, 4.7), (-18.125735931, 4.524264069), (-17.95, 4.1))
            Line((-17.95, 4.1), (-17.95, 3.1))
        make_face()
    extrude(amount=LPATTERN4_5_DEPTH)


solid = Compound([part.part, body_2.part, body_3.part, body_4.part, body_5.part, body_6.part, body_7.part])
